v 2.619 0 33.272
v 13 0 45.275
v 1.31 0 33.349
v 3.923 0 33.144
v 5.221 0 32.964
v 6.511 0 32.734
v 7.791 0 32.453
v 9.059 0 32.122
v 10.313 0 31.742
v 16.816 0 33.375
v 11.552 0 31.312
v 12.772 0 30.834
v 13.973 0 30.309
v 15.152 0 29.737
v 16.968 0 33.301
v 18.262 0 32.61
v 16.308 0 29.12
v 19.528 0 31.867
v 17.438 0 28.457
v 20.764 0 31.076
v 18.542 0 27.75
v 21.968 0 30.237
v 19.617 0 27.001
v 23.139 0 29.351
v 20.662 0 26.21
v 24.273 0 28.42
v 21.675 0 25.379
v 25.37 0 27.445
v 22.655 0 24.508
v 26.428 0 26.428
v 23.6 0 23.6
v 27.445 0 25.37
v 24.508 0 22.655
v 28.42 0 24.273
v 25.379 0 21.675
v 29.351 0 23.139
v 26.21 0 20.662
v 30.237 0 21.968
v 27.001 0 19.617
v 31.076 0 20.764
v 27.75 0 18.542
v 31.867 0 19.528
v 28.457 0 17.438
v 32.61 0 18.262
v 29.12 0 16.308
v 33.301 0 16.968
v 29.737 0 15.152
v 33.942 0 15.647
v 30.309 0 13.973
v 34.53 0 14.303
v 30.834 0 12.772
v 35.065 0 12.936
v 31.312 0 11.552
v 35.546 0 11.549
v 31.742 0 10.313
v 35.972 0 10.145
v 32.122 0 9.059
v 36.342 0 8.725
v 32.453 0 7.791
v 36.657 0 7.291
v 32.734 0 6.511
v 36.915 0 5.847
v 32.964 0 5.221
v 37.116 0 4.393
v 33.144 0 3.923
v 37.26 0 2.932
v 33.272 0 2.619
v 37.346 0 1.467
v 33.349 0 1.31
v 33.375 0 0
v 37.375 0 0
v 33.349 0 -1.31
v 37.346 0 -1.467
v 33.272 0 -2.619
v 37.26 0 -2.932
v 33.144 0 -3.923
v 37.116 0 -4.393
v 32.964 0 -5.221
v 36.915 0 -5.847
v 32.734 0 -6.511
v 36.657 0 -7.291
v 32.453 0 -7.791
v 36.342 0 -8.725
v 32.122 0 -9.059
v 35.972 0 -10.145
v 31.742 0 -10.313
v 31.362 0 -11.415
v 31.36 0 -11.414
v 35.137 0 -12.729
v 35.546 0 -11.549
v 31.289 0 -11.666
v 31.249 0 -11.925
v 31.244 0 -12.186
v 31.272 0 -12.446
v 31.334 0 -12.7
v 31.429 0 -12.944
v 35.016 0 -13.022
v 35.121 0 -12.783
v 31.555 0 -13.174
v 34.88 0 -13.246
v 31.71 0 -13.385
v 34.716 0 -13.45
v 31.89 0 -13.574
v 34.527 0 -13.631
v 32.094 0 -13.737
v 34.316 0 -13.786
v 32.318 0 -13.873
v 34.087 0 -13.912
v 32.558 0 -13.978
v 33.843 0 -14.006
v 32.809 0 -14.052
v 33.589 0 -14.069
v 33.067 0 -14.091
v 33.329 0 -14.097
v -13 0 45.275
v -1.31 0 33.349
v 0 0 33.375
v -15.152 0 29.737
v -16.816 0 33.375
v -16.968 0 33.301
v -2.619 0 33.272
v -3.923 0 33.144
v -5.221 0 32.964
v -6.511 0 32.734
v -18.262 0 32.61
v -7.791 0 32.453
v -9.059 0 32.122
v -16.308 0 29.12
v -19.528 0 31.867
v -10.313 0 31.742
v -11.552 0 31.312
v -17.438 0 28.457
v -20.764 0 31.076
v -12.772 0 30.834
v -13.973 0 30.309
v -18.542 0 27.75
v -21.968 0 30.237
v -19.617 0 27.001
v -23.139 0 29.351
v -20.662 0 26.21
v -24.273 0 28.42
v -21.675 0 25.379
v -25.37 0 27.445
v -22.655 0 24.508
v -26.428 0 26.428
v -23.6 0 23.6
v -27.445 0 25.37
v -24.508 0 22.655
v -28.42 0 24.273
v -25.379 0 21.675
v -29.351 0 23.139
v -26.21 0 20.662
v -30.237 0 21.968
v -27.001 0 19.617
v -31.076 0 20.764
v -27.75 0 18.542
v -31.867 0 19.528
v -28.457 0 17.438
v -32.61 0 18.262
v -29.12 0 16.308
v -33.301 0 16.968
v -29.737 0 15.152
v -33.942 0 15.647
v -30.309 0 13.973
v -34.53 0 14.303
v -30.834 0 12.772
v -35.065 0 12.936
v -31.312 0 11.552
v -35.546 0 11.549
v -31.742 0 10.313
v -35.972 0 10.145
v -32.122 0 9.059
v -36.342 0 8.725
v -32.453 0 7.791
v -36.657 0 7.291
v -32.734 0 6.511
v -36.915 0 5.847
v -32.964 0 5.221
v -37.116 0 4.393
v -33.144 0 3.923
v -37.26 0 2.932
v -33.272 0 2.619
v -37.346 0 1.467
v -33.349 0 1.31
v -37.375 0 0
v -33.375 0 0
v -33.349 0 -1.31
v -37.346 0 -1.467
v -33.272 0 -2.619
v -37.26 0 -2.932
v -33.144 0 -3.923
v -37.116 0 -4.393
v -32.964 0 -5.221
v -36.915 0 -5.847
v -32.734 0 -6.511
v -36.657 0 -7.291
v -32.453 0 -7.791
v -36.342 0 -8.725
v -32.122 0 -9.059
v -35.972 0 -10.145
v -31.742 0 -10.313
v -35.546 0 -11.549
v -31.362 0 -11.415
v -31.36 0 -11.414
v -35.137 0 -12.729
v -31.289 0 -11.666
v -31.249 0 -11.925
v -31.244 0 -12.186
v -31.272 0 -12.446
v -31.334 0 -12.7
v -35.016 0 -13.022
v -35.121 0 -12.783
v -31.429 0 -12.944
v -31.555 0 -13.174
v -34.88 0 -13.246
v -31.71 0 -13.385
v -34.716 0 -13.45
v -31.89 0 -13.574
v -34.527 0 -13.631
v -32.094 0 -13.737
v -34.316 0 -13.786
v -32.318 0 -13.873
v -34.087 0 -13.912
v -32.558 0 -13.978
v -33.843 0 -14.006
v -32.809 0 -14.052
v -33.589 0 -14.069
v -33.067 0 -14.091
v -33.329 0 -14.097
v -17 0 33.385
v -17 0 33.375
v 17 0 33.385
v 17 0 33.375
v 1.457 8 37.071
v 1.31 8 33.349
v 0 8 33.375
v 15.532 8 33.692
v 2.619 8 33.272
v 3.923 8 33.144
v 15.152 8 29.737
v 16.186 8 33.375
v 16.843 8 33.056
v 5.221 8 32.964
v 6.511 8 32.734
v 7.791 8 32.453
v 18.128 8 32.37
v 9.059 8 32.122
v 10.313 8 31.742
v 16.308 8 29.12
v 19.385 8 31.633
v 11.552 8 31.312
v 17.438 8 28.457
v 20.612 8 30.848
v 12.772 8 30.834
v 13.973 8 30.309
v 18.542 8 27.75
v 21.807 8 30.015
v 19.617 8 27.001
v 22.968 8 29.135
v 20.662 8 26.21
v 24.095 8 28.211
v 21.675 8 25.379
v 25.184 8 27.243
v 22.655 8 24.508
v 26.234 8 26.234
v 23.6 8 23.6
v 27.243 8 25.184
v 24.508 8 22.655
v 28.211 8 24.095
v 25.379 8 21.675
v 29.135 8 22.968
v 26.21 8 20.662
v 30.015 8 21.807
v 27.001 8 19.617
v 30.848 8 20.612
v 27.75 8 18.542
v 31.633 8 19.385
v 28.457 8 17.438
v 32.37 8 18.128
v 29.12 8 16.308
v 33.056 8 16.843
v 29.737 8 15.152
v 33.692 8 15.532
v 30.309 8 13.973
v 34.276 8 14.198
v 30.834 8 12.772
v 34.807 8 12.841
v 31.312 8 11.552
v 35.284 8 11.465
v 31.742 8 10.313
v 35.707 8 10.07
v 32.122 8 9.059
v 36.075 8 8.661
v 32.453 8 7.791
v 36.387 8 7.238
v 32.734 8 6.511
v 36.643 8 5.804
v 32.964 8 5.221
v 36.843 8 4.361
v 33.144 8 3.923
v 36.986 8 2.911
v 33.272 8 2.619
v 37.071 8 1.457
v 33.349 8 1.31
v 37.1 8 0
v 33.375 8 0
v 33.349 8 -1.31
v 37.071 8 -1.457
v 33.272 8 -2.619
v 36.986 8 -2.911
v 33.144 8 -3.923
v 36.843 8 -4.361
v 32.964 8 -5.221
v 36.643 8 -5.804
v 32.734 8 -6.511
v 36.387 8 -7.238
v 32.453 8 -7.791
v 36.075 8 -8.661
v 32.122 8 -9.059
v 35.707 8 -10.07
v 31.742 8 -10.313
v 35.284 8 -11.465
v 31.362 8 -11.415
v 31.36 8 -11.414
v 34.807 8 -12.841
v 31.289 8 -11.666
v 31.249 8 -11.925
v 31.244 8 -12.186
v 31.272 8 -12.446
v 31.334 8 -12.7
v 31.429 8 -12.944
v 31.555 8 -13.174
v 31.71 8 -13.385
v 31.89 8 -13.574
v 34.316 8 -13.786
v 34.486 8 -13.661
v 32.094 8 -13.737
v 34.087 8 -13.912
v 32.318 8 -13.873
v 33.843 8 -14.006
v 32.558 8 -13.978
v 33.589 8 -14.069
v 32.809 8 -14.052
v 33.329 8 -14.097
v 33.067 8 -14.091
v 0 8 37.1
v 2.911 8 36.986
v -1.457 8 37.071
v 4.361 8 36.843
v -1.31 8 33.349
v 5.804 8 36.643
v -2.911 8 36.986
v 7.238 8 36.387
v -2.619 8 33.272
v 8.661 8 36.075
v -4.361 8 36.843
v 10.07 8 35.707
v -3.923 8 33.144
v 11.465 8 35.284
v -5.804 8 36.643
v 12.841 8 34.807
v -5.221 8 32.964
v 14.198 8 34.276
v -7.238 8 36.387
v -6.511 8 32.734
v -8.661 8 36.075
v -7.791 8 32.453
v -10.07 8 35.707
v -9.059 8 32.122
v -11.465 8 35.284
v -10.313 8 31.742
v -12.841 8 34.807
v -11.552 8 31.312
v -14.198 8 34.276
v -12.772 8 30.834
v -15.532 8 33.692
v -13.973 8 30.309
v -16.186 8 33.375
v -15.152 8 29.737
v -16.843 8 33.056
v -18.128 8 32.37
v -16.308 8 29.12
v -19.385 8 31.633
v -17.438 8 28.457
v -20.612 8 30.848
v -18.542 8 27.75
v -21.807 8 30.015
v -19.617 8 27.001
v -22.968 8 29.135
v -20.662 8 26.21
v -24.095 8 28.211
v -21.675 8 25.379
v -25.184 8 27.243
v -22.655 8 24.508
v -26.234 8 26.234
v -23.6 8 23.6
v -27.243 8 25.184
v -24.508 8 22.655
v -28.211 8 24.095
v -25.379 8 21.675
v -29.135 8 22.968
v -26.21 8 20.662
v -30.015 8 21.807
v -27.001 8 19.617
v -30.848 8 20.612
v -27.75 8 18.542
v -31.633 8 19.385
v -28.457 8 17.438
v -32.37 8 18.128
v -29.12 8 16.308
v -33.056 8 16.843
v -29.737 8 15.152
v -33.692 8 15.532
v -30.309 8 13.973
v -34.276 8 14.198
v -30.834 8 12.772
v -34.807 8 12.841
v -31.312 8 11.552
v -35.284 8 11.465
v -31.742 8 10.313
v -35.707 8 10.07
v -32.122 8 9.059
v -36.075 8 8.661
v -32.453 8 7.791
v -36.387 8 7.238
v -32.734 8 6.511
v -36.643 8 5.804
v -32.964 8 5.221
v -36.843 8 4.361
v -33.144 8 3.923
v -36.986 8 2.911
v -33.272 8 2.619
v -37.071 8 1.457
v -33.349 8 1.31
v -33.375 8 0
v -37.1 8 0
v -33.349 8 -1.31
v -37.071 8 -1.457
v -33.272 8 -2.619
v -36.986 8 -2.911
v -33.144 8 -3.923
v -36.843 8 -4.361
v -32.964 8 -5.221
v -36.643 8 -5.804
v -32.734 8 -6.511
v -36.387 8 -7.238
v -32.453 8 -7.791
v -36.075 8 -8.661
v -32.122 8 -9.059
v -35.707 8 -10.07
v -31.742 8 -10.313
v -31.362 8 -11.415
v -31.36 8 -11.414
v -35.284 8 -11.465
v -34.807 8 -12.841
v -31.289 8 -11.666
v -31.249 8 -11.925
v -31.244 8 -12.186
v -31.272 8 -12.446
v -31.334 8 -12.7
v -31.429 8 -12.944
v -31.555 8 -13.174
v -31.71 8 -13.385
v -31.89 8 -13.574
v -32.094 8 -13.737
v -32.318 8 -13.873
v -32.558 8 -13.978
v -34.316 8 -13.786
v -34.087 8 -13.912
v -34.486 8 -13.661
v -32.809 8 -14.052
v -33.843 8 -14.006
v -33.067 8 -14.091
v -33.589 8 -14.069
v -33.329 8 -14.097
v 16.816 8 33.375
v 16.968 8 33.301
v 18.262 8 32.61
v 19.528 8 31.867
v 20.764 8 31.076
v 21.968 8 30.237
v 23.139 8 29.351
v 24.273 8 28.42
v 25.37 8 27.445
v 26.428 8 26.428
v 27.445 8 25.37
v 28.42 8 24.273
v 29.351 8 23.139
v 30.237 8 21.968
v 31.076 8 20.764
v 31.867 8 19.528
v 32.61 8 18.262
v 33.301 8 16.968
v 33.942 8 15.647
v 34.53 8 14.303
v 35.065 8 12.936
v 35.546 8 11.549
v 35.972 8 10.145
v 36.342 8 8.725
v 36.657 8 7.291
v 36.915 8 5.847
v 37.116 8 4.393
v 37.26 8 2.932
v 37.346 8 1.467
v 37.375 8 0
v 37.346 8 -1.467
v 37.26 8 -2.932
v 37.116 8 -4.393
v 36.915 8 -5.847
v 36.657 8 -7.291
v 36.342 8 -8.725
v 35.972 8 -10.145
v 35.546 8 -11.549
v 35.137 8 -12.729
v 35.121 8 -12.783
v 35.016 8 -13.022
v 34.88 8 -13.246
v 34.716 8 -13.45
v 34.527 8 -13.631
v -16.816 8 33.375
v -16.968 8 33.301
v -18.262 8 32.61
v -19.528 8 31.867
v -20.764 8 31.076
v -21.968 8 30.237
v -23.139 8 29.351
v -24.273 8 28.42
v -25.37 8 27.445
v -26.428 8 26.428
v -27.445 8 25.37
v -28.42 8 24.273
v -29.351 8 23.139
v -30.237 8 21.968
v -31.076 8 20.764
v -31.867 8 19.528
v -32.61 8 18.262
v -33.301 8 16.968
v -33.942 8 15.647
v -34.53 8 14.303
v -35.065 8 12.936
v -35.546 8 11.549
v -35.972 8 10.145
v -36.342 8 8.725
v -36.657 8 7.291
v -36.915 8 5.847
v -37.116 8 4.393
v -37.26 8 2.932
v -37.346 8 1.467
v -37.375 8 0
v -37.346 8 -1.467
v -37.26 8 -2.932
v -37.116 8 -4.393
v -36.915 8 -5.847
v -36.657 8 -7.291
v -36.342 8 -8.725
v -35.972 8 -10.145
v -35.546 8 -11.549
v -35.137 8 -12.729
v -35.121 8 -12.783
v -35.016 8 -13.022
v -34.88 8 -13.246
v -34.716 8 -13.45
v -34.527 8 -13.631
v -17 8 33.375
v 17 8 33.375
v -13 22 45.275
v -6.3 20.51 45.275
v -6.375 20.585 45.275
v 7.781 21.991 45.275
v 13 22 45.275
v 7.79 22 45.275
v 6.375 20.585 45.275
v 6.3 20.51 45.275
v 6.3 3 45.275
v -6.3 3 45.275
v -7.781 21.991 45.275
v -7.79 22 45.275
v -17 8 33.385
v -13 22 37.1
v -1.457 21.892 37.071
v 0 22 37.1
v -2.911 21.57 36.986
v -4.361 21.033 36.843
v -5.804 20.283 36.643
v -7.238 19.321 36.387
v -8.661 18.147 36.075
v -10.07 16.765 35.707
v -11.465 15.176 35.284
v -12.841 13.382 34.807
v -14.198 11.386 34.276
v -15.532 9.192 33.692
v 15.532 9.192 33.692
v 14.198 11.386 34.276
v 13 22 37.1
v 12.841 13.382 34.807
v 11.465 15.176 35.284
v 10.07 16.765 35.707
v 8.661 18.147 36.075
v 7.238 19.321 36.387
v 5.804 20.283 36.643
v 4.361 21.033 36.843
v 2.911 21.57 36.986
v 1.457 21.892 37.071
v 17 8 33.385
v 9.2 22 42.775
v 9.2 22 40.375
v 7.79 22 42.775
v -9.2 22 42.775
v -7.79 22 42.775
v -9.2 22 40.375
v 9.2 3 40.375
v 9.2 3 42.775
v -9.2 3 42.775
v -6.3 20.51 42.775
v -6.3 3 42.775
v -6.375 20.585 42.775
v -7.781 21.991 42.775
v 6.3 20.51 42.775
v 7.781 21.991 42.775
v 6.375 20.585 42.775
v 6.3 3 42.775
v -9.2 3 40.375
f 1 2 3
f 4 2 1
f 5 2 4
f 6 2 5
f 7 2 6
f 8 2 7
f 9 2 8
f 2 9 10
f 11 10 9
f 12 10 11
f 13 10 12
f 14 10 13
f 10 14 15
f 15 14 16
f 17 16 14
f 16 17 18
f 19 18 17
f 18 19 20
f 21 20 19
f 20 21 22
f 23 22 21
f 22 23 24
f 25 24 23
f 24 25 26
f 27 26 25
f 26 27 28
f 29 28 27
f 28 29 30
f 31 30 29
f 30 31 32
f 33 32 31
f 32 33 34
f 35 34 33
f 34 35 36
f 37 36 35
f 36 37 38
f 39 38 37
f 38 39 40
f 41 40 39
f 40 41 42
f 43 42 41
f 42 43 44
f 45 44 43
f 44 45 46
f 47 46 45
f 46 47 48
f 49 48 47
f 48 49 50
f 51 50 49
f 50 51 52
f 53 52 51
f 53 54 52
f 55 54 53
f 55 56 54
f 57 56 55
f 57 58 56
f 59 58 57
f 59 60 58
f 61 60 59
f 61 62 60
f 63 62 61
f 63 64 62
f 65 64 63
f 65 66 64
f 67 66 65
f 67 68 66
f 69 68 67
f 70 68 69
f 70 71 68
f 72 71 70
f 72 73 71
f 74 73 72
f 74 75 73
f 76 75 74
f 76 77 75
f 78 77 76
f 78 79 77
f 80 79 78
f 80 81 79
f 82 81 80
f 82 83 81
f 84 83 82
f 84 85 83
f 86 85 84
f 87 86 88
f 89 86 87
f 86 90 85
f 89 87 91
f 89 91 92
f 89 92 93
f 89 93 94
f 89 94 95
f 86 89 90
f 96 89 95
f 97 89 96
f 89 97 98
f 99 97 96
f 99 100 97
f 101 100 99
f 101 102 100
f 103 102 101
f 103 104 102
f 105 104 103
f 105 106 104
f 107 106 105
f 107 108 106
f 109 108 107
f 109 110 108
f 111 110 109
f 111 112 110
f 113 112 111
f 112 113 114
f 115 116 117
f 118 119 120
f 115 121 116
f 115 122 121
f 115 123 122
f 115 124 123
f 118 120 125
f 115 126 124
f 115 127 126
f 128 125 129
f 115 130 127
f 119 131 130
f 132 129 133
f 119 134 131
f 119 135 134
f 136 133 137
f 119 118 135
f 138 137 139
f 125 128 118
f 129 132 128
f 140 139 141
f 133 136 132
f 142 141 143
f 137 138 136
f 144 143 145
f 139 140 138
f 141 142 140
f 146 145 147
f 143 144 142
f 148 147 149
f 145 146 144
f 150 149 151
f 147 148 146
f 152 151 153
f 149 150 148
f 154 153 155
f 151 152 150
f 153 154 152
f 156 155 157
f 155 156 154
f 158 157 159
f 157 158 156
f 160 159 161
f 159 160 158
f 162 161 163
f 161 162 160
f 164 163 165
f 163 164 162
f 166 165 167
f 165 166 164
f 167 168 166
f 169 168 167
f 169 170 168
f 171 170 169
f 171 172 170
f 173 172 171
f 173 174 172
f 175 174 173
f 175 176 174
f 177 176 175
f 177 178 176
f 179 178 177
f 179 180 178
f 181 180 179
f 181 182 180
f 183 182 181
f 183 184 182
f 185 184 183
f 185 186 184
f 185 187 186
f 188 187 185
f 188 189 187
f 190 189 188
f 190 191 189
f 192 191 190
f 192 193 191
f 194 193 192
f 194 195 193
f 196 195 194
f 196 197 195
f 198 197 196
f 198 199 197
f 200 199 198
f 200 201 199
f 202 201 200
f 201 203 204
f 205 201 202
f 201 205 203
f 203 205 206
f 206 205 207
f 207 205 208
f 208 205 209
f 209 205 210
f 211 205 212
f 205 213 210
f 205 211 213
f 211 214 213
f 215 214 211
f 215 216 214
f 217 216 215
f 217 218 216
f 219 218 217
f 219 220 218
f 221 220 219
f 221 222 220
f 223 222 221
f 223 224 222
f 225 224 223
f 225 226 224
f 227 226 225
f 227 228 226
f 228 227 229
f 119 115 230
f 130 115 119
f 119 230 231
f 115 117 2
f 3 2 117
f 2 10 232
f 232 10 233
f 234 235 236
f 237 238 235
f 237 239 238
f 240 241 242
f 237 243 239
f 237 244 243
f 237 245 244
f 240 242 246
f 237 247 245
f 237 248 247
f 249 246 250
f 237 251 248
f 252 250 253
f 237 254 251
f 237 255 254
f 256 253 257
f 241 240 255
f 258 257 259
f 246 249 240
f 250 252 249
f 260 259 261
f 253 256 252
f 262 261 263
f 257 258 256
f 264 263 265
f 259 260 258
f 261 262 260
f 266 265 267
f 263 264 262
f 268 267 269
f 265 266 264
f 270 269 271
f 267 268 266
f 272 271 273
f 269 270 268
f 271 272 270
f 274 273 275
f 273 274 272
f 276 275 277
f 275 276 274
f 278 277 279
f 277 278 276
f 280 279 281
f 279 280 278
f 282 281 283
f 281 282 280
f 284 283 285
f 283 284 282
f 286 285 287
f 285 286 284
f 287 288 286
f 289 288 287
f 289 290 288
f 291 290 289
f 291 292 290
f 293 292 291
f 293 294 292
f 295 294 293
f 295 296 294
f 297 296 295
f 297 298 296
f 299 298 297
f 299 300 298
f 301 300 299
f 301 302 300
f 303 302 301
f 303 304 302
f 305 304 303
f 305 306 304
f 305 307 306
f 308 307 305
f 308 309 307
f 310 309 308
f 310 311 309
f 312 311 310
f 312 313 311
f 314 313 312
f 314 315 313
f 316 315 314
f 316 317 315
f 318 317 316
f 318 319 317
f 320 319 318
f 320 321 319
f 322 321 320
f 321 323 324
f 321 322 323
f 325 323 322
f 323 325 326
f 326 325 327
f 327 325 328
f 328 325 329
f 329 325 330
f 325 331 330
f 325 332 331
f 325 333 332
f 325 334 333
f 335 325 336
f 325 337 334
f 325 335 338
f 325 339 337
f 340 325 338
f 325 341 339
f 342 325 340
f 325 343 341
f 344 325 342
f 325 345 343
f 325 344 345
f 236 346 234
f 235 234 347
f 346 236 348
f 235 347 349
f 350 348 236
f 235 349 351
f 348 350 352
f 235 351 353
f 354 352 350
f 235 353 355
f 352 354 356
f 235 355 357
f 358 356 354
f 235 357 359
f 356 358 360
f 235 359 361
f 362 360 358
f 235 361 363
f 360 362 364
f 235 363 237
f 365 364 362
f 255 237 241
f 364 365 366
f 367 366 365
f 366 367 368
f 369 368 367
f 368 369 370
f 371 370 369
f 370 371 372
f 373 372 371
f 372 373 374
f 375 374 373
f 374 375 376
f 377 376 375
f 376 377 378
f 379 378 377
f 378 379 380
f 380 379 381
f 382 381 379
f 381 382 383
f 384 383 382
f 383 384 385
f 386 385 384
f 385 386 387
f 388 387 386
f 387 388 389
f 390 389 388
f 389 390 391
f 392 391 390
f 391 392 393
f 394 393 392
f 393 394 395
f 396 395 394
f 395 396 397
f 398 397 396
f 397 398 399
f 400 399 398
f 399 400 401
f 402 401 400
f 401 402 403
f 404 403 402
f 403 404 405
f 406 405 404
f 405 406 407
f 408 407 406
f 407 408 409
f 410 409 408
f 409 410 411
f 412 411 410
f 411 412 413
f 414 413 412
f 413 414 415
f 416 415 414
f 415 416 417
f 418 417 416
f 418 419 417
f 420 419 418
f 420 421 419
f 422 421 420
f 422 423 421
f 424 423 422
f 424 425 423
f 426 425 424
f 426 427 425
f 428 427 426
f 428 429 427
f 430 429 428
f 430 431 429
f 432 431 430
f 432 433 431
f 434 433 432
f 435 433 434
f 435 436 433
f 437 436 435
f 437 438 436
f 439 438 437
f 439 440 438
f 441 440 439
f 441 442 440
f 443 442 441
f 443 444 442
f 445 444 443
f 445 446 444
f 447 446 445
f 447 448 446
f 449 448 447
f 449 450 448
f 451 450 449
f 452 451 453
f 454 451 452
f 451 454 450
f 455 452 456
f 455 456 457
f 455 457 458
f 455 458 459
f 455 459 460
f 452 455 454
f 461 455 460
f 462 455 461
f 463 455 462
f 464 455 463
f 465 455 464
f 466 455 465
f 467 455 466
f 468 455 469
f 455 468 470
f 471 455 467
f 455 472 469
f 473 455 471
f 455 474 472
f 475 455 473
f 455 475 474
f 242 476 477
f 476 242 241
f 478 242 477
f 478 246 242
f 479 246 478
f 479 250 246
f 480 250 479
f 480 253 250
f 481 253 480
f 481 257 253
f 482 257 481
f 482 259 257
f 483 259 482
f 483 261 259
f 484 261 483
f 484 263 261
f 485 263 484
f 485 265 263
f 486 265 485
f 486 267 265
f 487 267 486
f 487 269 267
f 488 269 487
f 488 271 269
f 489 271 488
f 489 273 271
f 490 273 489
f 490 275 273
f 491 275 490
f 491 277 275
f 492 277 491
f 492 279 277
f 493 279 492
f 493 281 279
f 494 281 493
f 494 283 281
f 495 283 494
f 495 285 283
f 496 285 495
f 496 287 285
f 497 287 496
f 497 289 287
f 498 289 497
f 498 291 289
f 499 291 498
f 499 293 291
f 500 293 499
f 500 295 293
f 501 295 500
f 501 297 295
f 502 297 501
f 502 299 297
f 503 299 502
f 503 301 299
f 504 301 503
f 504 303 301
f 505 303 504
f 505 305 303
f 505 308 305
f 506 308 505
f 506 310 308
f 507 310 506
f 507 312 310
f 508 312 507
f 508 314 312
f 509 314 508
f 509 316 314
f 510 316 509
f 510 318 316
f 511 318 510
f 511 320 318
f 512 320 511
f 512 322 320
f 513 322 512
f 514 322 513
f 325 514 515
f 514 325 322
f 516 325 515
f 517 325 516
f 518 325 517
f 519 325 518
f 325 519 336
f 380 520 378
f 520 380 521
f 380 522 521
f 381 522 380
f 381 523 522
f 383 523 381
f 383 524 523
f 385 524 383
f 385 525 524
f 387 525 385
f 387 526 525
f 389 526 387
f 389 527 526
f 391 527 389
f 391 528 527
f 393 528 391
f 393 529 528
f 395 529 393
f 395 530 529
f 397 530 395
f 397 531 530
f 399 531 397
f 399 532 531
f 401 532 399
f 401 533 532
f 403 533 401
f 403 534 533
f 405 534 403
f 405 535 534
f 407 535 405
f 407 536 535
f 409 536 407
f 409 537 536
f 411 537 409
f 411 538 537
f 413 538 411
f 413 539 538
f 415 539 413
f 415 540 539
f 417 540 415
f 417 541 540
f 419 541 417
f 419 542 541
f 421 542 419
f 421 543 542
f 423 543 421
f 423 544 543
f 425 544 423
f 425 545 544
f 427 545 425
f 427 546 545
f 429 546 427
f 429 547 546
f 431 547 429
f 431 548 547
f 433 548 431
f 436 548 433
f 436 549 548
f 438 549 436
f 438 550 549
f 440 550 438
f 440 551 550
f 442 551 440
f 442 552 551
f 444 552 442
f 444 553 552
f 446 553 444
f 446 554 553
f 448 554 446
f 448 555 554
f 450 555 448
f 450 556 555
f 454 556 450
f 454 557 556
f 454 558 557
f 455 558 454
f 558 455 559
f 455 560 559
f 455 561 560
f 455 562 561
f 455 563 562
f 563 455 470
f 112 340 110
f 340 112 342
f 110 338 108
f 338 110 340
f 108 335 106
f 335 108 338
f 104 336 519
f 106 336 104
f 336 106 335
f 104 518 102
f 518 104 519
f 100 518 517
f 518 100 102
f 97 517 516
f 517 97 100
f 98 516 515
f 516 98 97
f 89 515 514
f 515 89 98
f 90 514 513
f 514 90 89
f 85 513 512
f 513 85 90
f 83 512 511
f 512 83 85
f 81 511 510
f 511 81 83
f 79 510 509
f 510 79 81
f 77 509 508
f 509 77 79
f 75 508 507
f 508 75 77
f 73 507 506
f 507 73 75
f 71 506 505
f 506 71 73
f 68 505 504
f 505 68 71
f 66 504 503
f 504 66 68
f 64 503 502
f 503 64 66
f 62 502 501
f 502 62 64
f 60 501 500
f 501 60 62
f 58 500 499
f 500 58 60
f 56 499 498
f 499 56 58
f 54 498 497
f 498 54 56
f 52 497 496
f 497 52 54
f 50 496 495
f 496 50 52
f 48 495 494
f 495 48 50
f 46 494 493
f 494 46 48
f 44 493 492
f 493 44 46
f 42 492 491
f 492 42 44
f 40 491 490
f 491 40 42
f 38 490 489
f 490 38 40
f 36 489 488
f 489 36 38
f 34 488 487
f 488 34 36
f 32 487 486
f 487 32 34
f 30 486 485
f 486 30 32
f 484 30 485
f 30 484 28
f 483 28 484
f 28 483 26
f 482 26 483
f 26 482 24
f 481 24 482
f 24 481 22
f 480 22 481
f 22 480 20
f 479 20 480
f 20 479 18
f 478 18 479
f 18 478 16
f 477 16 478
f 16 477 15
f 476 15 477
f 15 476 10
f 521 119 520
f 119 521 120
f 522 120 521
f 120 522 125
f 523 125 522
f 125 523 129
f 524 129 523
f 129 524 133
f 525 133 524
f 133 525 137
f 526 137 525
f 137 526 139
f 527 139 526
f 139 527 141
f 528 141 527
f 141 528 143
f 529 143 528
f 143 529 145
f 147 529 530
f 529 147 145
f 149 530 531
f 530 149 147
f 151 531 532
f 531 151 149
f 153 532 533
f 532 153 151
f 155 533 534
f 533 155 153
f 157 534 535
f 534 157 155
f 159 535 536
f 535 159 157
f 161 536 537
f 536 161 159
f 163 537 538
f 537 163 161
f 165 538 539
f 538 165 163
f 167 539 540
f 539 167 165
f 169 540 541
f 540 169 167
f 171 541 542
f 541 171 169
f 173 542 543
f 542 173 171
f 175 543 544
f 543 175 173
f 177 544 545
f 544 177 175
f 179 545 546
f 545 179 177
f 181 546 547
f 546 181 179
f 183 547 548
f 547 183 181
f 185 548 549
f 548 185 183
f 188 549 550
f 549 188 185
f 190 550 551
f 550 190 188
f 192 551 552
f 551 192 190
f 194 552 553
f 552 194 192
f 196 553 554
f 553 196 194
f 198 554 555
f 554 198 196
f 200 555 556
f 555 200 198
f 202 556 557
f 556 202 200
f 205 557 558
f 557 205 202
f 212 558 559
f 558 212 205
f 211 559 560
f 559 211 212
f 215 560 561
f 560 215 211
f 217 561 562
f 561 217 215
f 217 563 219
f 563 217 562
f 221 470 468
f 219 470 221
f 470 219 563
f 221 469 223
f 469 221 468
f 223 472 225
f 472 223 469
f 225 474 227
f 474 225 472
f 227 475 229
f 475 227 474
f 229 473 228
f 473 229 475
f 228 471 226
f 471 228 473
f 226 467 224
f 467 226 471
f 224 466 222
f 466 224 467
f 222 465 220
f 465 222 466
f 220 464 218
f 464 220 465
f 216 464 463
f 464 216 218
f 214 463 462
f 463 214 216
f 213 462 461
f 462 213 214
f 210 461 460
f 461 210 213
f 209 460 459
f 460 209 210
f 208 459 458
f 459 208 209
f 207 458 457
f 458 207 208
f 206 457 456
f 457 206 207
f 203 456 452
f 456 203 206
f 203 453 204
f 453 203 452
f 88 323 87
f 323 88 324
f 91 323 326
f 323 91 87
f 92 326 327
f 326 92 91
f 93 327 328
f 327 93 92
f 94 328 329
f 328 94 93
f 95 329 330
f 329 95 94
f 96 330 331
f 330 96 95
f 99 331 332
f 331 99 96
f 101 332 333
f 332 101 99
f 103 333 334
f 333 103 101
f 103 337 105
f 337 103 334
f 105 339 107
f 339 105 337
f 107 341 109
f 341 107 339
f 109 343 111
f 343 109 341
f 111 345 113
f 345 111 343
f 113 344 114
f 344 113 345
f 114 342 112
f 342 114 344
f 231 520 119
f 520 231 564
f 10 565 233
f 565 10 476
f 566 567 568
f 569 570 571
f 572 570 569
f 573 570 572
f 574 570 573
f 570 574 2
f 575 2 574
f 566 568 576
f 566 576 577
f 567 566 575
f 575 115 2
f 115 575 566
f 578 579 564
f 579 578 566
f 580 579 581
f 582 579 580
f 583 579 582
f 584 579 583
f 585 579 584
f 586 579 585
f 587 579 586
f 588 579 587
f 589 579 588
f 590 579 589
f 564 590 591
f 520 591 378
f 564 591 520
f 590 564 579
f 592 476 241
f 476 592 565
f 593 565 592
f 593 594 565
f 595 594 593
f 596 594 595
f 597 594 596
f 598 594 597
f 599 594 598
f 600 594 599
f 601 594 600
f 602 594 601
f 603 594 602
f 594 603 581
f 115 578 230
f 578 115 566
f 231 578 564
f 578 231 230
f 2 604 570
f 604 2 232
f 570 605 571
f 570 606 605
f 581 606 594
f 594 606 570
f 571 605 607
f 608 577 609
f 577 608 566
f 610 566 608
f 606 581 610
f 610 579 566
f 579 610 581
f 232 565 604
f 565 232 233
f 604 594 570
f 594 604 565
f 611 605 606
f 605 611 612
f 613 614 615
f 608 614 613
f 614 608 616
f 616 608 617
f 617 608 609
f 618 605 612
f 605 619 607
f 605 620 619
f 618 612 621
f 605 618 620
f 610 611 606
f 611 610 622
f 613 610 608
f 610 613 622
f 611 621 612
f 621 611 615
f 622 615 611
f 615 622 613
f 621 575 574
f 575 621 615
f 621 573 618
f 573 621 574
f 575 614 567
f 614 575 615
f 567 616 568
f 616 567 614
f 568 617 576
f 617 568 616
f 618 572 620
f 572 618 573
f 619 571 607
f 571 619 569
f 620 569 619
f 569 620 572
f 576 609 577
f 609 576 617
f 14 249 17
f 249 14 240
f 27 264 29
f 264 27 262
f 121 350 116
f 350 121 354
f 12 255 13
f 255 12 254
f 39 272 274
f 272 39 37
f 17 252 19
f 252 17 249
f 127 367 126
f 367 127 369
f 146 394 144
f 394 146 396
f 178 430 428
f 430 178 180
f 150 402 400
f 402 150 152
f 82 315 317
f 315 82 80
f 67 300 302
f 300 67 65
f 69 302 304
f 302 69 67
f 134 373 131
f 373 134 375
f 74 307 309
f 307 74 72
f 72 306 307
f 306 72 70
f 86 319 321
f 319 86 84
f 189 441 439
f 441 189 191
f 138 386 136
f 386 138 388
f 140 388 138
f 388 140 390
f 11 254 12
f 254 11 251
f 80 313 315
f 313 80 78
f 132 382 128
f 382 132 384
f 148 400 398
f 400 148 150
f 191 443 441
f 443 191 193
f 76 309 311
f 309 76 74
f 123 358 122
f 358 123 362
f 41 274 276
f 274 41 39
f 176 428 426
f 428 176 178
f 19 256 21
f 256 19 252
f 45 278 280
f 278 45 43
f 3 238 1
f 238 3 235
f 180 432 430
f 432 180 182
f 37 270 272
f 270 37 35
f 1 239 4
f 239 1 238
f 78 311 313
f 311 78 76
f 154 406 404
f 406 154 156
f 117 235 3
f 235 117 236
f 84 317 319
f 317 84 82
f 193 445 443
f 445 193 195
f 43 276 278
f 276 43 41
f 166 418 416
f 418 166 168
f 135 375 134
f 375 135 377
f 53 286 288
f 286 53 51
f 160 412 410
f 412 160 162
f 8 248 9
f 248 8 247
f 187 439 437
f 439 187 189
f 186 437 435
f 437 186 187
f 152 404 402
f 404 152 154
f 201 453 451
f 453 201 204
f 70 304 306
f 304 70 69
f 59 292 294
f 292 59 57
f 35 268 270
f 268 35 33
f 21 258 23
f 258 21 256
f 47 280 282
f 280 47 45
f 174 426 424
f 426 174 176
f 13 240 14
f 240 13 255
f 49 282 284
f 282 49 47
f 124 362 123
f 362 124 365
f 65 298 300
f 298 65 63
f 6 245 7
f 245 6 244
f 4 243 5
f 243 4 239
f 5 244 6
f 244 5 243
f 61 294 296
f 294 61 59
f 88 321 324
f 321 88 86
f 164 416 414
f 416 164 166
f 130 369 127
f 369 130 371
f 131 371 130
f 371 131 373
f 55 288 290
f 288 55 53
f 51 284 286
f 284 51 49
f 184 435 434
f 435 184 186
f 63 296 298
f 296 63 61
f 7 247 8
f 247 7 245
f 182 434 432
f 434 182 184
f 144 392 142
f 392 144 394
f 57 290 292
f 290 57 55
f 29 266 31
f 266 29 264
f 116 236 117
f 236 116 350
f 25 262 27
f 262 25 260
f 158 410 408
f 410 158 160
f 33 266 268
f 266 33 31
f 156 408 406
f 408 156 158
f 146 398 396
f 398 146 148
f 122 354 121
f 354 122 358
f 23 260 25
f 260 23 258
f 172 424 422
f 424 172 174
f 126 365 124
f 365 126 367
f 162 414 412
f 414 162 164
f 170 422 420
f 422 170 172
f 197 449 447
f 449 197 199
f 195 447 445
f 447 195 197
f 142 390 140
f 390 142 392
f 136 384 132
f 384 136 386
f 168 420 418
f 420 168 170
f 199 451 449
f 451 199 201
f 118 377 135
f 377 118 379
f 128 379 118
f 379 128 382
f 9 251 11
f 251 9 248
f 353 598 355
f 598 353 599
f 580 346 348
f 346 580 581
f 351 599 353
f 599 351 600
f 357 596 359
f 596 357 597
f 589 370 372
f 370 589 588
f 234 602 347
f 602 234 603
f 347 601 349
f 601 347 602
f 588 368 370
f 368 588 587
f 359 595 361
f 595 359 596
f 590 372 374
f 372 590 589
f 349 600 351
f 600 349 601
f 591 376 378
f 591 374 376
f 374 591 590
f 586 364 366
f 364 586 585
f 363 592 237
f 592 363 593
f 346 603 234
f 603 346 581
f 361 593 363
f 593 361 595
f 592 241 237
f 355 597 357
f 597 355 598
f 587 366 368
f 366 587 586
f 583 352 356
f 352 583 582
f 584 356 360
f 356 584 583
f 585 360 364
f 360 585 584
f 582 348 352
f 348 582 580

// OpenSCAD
// Snap-on lens clip with a shoe slot
// ----------------------------------
// A C-shaped clip that snaps over the fixed part of a lens barrel (no
// screws) and carries an ISO 518 shoe slot on top, so a monitor or
// teleprompter sits right above the lens. Made for short lenses such as
// the Canon EF-S 24mm f/2.8 STM pancake, where there is only a narrow band
// of fixed barrel between the mount and the focus ring: the clip grips that
// band and the shoe platform reaches forward over the focus ring without
// touching it.
//
// Coordinate system: lens axis = Y, with Y = 0 at the rear face (camera
// side) and +Y towards the front of the lens. The clip opening faces -Z.
//
// Print standing on its rear face (the face that goes against the camera).
// Every layer is then a complete C, which is what makes it flex without
// cracking, and the shoe slot prints with no supports.
// PLA is fine for a light monitor; PETG is more forgiving if it gets snapped
// on and off a lot. Line the bore with ~1 mm rubber tape so it grips.

/* [What to render] */
// clip = the part; size_test = four thin C-rings with different bores, to
// find the snug fit fast (1 to 4 notches on the outside = smallest to largest)
part = "clip"; // [clip, size_test]
// Bores tried by size_test: size_test_start, +step, +2*step, +3*step
size_test_start = 67.0;
size_test_step = 0.5;

/* [Lens] */
// Diameter of the fixed barrel where the clip sits (measure it)
lens_d = 68.2;
// Liner thickness (rubber tape / felt). 0 = bare plastic
liner_t = 1.0;
// How much smaller the bore is than lens + liner, so the clip squeezes
grip = 0.3;
// Set this to override the bore diameter directly (e.g. the size that fit
// best in size_test); 0 = lens_d + 2 * liner_t - 2 * grip.
// 66.75 = bare-PLA snug fit on the EF-S 24mm f/2.8 STM (67.0 test ring fit, tightened a touch)
bore_d = 66.75;

/* [Clip] */
// Width of the band that grips the barrel; must fit between the mount and
// the focus ring without touching either
band_w = 8;
// Radial wall thickness of the C
wall = 4;
// How far the C wraps around the barrel (degrees); >180 so it snaps on
wrap = 220;

/* [Shoe platform] */
// Platform length along the lens, measured forward from the rear face
platform_len = 22;
platform_w = 26;
// Gap between the platform underside and the lens in front of the band
lens_clear = 3;

/* [Shoe slot (ISO 518)] */
shoe_tol = 0.4;
shoe_foot_w = 18.0;
shoe_foot_t = 2.0;
shoe_open_w = 12.6;
shoe_rail_t = 2.5;
// Plastic under the shoe channel
shoe_floor = 3;
// Thickness of the end stop at the rear (camera) end; the slot is open at
// the front so the foot slides in from the front of the lens
shoe_stop = 3;

/* [Hidden] */
$fn = 160;
eps = 0.01;

lens_r = lens_d / 2;
inner_r = bore_d > 0 ? bore_d / 2 : lens_r + liner_t - grip;
outer_r = inner_r + wall;

ch_w = shoe_foot_w + shoe_tol;
ch_h = shoe_foot_t + shoe_tol;
plat_bottom = lens_r + lens_clear;
ch_z = max(plat_bottom, outer_r) + shoe_floor;
plat_top = ch_z + ch_h + shoe_rail_t;

assert(wrap > 180 && wrap < 300, "wrap should be between 180 and 300 degrees");
assert(platform_len >= band_w, "platform_len must be at least band_w");
assert(platform_w >= ch_w + 4, "platform_w too narrow for the shoe channel");
assert(platform_len - shoe_stop >= 15, "platform too short for a shoe foot");

// 2D C profile, opening centred on -Z (2D Y here is Z in the part)
module c_profile(inner_r = inner_r, outer_r = outer_r) {
    gap = 360 - wrap;
    tip_r = wall / 2;
    mid_r = (inner_r + outer_r) / 2;
    difference() {
        circle(r = outer_r);
        circle(r = inner_r);
        // wedge removing the opening
        rotate(-90 - gap / 2)
            polygon([[0, 0],
                     for (a = [0 : gap / 8 : gap]) 2 * outer_r * [cos(a), sin(a)]]);
    }
    // rounded tips so it slides on without catching
    for (s = [-1, 1])
        rotate(-90 + s * gap / 2) translate([mid_r, 0]) circle(r = tip_r, $fn = 48);
}

module shoe_cut() {
    // channel for the foot, open at the front
    translate([-ch_w / 2, shoe_stop, ch_z]) cube([ch_w, platform_len, ch_h]);
    // opening between the rails
    translate([-shoe_open_w / 2, shoe_stop, ch_z]) cube([shoe_open_w, platform_len, plat_top]);
    // lead-in chamfer at the front of the rails
    translate([0, platform_len + eps, plat_top])
        rotate([90, 0, 0])
            linear_extrude(height = 1.5, scale = [shoe_open_w / (shoe_open_w + 3), 1])
                square([shoe_open_w + 3, 2 * shoe_rail_t + 0.2], center = true);
}

module clip() {
    difference() {
        union() {
            // the C band
            rotate([-90, 0, 0]) mirror([0, 1, 0])
                linear_extrude(height = band_w) c_profile();
            // shoe platform: joined to the band at the rear, cantilevered
            // forward above the focus ring
            hull() {
                translate([-platform_w / 2, 0, plat_bottom])
                    cube([platform_w, platform_len, plat_top - plat_bottom]);
                // gusset down onto the band
                translate([-platform_w / 2 - 4, 0, outer_r - wall])
                    cube([platform_w + 8, band_w, eps]);
            }
        }
        // keep the bore clear (the hull would otherwise fill it)
        rotate([-90, 0, 0]) translate([0, 0, -1])
            cylinder(r = inner_r, h = platform_len + 2);
        // and keep the platform off the lens in front of the band
        translate([0, band_w, 0]) rotate([-90, 0, 0])
            cylinder(r = plat_bottom, h = platform_len);
        shoe_cut();
    }
}

// Thin test ring with n notches on the outside of its crown
module test_ring(bore, n) {
    difference() {
        linear_extrude(height = 4) c_profile(bore / 2, bore / 2 + wall);
        for (i = [0 : n - 1])
            rotate(90 + (i - (n - 1) / 2) * 6)
                translate([bore / 2 + wall, 0, -1]) cylinder(r = 1, h = 6, $fn = 16);
    }
}

if (part == "size_test") {
    pitch = size_test_start + size_test_step * 3 + 2 * wall + 6;
    for (i = [0 : 3])
        translate([(i % 2) * pitch, floor(i / 2) * pitch, 0])
            test_ring(size_test_start + i * size_test_step, i + 1);
    for (i = [0 : 3])
        echo(str(i + 1, " notch(es): bore ", size_test_start + i * size_test_step, " mm"));
} else {
    clip();
    // ghost of the lens barrel
    %rotate([-90, 0, 0]) translate([0, 0, -5]) cylinder(d = lens_d, h = platform_len + 10);
}

echo(bore_d > 0 ? str("Bore = ", bore_d, " mm (bore_d override)")
                 : str("Bore = ", 2 * inner_r, " mm (lens ", lens_d, " + liner, minus grip)"));
echo(str("Snap opening = ", 2 * inner_r * sin((360 - wrap) / 2), " mm"));
echo(str("Shoe top is ", plat_top - lens_r, " mm above the lens surface"));
